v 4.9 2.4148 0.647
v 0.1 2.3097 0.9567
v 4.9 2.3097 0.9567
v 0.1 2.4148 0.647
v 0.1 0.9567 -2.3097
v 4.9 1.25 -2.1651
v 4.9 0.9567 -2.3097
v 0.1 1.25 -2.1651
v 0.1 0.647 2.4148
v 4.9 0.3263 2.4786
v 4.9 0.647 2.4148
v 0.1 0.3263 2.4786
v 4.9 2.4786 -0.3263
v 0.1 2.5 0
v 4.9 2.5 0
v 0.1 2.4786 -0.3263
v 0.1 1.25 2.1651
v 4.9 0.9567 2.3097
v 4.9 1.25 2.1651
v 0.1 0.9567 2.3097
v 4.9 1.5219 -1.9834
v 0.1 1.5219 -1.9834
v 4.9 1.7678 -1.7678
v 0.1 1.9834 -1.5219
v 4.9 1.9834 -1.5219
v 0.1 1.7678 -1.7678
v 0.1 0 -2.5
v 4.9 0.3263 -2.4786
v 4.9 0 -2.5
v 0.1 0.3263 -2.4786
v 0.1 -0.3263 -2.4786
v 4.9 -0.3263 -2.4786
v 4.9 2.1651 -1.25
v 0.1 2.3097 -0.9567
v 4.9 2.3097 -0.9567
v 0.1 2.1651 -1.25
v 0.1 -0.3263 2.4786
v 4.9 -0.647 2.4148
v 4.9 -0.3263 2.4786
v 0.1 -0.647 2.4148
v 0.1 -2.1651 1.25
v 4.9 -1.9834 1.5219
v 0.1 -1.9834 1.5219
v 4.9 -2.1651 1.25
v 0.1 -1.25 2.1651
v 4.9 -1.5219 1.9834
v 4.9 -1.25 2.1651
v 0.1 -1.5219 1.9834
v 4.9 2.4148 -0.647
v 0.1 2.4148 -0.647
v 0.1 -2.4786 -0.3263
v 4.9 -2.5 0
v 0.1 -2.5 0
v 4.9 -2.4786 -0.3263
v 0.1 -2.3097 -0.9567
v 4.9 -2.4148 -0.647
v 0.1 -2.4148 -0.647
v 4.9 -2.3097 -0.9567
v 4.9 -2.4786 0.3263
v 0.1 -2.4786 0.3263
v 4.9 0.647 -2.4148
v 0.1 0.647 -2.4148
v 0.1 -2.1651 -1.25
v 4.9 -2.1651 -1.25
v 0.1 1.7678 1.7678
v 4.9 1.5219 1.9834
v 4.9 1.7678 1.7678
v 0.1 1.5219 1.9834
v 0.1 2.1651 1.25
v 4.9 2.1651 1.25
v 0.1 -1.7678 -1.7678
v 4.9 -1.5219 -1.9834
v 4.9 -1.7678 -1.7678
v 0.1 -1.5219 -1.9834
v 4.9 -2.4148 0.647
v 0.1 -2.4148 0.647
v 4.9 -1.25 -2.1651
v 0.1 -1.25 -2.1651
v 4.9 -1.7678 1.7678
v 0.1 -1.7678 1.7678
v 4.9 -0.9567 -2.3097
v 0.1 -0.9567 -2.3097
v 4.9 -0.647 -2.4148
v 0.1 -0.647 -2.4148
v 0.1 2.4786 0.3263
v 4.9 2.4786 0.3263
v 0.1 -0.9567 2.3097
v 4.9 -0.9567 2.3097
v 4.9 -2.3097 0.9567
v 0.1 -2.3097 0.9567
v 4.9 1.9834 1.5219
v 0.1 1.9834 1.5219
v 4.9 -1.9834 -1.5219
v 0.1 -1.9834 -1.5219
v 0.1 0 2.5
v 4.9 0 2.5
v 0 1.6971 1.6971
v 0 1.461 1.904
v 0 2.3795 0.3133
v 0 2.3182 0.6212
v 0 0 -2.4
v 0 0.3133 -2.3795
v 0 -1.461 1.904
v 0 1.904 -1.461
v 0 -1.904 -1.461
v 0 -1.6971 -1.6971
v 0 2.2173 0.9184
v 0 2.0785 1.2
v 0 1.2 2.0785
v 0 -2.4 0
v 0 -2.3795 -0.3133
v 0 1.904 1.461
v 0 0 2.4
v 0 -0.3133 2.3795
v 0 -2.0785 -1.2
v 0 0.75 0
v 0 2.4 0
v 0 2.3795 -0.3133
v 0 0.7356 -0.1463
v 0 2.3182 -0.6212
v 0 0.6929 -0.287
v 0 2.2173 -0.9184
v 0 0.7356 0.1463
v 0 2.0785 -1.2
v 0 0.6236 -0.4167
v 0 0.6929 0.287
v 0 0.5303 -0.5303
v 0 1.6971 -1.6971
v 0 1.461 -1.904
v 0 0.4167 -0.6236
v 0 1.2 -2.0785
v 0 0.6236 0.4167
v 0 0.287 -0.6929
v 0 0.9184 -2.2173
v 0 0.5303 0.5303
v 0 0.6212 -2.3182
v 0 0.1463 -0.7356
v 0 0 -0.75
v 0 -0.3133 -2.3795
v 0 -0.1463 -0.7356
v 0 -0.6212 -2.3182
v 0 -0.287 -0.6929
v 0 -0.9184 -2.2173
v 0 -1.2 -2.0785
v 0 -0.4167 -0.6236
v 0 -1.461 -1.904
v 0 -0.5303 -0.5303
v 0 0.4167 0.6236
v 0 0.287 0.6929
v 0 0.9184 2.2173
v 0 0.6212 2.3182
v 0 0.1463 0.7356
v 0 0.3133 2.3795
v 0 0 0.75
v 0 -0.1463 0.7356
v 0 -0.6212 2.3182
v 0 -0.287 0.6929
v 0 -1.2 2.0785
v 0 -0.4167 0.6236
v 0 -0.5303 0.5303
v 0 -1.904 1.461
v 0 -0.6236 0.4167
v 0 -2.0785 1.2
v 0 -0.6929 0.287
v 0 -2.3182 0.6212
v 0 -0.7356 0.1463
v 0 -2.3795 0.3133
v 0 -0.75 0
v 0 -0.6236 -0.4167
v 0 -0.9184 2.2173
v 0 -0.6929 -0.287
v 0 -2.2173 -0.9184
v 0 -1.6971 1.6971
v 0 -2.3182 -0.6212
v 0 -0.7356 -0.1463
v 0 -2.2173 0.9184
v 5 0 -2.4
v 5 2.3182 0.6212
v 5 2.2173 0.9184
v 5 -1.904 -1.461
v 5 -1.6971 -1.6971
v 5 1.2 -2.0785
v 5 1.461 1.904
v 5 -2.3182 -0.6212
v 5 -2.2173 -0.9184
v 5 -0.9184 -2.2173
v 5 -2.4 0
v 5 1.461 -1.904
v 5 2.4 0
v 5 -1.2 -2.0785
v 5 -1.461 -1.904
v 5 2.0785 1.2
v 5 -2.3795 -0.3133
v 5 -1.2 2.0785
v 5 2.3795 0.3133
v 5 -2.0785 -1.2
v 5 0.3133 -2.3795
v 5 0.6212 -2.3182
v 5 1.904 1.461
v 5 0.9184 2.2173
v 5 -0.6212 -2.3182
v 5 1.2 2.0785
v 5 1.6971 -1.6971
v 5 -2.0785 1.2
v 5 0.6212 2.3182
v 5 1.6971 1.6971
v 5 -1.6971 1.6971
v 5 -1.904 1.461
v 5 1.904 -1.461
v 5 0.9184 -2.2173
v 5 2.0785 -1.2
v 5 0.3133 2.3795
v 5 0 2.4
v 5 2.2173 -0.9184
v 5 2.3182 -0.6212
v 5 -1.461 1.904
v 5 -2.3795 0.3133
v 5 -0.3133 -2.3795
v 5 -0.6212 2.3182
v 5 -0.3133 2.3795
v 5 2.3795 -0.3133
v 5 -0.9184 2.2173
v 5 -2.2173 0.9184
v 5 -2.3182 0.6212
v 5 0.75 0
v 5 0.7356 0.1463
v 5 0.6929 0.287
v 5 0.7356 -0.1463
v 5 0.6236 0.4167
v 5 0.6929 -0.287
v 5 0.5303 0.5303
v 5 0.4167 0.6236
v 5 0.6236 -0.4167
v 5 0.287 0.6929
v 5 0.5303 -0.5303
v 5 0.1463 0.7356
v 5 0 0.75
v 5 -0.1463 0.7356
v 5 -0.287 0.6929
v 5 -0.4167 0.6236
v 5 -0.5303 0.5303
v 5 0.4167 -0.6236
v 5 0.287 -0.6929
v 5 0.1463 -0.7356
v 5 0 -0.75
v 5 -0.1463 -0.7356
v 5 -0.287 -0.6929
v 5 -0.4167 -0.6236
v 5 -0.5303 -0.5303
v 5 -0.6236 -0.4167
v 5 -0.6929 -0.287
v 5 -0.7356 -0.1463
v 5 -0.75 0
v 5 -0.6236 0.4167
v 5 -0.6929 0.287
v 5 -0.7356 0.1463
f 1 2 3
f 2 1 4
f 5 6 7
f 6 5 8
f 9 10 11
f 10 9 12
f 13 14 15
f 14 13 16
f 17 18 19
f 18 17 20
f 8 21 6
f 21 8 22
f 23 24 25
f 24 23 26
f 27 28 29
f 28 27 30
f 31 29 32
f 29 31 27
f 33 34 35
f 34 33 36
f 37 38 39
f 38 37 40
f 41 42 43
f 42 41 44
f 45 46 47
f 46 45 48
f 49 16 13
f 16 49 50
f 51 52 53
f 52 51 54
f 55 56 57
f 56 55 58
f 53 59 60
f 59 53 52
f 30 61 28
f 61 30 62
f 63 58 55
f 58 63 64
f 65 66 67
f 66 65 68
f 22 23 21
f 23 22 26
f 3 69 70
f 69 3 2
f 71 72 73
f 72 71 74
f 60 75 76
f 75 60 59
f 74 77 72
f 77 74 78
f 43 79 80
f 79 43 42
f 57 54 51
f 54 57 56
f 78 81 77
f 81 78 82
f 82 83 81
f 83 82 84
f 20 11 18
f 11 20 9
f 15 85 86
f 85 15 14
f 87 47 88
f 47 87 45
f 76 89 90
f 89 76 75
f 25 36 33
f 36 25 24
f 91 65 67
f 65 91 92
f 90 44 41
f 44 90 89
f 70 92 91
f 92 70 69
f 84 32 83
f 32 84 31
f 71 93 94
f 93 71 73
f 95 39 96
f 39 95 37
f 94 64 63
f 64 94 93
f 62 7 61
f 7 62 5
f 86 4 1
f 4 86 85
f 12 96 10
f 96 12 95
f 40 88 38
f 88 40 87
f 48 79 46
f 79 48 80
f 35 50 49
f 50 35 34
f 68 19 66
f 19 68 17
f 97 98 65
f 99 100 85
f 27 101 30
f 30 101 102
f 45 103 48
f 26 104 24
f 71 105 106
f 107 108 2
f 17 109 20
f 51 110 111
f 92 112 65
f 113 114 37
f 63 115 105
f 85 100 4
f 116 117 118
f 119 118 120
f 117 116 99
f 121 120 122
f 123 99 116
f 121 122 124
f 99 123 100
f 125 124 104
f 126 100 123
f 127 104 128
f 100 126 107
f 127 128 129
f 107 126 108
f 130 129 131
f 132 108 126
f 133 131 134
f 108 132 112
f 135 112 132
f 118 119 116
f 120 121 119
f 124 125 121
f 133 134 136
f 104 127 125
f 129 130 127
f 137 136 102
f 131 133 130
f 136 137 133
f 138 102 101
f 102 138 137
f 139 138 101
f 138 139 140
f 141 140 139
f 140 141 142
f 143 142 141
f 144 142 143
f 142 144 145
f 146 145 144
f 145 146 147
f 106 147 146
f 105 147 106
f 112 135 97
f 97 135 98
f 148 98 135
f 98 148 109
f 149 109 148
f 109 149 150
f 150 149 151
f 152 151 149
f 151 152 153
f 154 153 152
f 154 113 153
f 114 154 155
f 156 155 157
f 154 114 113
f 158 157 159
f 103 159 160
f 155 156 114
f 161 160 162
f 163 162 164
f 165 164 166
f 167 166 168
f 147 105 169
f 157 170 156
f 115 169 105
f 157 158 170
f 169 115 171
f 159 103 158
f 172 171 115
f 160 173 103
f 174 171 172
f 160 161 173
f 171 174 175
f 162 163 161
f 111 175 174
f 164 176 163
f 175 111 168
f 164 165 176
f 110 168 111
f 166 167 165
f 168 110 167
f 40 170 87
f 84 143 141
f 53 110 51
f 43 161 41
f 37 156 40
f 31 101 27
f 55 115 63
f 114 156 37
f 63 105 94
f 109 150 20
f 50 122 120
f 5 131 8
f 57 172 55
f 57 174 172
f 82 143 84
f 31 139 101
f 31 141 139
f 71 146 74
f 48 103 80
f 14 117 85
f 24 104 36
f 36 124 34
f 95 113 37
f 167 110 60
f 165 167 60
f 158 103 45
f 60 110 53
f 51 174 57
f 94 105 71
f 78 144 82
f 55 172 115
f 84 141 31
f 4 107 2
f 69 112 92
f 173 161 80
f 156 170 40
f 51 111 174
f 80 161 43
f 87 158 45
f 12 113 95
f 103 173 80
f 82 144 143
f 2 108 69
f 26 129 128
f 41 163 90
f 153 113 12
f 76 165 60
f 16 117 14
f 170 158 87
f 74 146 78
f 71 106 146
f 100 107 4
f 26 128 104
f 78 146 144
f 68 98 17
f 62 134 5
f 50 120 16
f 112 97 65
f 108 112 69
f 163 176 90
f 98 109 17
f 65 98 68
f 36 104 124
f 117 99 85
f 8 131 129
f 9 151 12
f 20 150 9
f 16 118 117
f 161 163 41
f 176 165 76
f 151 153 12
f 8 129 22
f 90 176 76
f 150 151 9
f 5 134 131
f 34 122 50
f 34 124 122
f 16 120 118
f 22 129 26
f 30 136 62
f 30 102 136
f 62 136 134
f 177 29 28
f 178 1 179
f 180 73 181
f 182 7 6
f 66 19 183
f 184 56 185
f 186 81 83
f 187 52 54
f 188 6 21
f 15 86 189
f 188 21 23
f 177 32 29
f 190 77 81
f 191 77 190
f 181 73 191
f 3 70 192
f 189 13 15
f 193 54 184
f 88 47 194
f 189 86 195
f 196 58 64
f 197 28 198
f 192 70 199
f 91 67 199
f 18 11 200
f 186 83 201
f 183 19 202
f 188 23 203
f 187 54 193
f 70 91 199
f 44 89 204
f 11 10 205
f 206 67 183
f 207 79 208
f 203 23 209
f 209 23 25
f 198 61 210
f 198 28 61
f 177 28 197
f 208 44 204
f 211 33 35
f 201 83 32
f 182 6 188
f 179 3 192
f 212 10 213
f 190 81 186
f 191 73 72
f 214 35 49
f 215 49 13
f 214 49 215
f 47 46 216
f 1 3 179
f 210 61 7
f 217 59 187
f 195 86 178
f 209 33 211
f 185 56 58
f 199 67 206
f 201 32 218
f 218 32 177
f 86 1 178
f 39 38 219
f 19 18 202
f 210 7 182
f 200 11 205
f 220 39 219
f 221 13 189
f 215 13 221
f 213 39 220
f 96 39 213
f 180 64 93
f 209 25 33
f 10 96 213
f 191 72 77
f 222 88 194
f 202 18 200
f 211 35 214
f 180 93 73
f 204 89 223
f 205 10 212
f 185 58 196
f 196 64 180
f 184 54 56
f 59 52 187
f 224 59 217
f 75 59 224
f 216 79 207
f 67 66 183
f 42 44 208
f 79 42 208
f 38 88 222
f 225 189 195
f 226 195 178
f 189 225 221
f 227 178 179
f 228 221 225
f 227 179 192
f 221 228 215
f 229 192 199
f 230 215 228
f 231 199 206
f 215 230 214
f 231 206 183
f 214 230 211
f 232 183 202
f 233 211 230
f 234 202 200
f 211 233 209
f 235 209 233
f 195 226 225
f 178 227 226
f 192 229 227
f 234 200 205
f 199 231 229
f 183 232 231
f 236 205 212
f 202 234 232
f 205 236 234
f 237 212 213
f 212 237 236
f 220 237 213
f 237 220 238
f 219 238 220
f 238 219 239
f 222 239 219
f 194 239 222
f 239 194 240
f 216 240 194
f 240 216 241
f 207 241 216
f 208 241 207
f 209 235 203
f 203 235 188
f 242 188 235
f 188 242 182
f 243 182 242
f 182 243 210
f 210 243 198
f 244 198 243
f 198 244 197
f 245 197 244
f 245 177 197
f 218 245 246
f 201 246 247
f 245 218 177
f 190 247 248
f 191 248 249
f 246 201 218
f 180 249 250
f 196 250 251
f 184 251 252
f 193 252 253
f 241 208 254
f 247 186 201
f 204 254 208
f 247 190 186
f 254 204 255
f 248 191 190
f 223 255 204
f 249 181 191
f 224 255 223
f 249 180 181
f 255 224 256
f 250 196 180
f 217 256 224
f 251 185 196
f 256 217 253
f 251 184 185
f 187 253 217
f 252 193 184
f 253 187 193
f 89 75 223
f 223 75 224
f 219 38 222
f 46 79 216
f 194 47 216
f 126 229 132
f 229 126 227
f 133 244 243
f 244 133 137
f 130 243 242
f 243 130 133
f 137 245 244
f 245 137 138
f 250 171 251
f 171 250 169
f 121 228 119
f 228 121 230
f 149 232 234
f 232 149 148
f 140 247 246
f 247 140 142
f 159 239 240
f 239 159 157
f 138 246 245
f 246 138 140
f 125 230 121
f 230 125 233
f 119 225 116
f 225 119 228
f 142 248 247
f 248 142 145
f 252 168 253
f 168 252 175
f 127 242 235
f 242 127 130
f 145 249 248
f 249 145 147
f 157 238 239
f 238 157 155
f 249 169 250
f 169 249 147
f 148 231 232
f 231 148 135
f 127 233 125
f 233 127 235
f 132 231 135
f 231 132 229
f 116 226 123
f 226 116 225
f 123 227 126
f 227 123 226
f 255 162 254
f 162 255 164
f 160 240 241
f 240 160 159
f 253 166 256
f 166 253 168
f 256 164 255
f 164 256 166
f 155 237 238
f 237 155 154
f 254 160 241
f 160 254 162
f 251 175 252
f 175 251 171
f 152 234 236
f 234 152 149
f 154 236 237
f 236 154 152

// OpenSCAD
// part_id: b13
// name: B13 roller
// source_drawing_ids: DRW-002
// units: mm
// revision: 0.1
// SPDX-License-Identifier: MIT

module part_b13(
    roller_d = 5.0,
    roller_len = 5.0,
    bore_d = 1.5,
    edge_chamfer = 0.1
) {
    difference() {
        union() {
            if (roller_len > 2 * edge_chamfer) {
                translate([edge_chamfer, 0, 0])
                    rotate([0, 90, 0])
                        cylinder(
                            d = roller_d,
                            h = roller_len - 2 * edge_chamfer,
                            center = false,
                            $fn = 48
                        );
            }

            rotate([0, 90, 0])
                cylinder(
                    d1 = roller_d - 2 * edge_chamfer,
                    d2 = roller_d,
                    h = edge_chamfer,
                    center = false,
                    $fn = 48
                );

            translate([roller_len - edge_chamfer, 0, 0])
                rotate([0, 90, 0])
                    cylinder(
                        d1 = roller_d,
                        d2 = roller_d - 2 * edge_chamfer,
                        h = edge_chamfer,
                        center = false,
                        $fn = 48
                    );
        }

        translate([-0.1, 0, 0])
            rotate([0, 90, 0])
                cylinder(d = bore_d, h = roller_len + 0.2, center = false, $fn = 32);
    }
}

// ---- "main guard" ----
// Default to previewing when opened directly:
if (is_undef(__LIB_MODE__)) {
    part_b13();
}
